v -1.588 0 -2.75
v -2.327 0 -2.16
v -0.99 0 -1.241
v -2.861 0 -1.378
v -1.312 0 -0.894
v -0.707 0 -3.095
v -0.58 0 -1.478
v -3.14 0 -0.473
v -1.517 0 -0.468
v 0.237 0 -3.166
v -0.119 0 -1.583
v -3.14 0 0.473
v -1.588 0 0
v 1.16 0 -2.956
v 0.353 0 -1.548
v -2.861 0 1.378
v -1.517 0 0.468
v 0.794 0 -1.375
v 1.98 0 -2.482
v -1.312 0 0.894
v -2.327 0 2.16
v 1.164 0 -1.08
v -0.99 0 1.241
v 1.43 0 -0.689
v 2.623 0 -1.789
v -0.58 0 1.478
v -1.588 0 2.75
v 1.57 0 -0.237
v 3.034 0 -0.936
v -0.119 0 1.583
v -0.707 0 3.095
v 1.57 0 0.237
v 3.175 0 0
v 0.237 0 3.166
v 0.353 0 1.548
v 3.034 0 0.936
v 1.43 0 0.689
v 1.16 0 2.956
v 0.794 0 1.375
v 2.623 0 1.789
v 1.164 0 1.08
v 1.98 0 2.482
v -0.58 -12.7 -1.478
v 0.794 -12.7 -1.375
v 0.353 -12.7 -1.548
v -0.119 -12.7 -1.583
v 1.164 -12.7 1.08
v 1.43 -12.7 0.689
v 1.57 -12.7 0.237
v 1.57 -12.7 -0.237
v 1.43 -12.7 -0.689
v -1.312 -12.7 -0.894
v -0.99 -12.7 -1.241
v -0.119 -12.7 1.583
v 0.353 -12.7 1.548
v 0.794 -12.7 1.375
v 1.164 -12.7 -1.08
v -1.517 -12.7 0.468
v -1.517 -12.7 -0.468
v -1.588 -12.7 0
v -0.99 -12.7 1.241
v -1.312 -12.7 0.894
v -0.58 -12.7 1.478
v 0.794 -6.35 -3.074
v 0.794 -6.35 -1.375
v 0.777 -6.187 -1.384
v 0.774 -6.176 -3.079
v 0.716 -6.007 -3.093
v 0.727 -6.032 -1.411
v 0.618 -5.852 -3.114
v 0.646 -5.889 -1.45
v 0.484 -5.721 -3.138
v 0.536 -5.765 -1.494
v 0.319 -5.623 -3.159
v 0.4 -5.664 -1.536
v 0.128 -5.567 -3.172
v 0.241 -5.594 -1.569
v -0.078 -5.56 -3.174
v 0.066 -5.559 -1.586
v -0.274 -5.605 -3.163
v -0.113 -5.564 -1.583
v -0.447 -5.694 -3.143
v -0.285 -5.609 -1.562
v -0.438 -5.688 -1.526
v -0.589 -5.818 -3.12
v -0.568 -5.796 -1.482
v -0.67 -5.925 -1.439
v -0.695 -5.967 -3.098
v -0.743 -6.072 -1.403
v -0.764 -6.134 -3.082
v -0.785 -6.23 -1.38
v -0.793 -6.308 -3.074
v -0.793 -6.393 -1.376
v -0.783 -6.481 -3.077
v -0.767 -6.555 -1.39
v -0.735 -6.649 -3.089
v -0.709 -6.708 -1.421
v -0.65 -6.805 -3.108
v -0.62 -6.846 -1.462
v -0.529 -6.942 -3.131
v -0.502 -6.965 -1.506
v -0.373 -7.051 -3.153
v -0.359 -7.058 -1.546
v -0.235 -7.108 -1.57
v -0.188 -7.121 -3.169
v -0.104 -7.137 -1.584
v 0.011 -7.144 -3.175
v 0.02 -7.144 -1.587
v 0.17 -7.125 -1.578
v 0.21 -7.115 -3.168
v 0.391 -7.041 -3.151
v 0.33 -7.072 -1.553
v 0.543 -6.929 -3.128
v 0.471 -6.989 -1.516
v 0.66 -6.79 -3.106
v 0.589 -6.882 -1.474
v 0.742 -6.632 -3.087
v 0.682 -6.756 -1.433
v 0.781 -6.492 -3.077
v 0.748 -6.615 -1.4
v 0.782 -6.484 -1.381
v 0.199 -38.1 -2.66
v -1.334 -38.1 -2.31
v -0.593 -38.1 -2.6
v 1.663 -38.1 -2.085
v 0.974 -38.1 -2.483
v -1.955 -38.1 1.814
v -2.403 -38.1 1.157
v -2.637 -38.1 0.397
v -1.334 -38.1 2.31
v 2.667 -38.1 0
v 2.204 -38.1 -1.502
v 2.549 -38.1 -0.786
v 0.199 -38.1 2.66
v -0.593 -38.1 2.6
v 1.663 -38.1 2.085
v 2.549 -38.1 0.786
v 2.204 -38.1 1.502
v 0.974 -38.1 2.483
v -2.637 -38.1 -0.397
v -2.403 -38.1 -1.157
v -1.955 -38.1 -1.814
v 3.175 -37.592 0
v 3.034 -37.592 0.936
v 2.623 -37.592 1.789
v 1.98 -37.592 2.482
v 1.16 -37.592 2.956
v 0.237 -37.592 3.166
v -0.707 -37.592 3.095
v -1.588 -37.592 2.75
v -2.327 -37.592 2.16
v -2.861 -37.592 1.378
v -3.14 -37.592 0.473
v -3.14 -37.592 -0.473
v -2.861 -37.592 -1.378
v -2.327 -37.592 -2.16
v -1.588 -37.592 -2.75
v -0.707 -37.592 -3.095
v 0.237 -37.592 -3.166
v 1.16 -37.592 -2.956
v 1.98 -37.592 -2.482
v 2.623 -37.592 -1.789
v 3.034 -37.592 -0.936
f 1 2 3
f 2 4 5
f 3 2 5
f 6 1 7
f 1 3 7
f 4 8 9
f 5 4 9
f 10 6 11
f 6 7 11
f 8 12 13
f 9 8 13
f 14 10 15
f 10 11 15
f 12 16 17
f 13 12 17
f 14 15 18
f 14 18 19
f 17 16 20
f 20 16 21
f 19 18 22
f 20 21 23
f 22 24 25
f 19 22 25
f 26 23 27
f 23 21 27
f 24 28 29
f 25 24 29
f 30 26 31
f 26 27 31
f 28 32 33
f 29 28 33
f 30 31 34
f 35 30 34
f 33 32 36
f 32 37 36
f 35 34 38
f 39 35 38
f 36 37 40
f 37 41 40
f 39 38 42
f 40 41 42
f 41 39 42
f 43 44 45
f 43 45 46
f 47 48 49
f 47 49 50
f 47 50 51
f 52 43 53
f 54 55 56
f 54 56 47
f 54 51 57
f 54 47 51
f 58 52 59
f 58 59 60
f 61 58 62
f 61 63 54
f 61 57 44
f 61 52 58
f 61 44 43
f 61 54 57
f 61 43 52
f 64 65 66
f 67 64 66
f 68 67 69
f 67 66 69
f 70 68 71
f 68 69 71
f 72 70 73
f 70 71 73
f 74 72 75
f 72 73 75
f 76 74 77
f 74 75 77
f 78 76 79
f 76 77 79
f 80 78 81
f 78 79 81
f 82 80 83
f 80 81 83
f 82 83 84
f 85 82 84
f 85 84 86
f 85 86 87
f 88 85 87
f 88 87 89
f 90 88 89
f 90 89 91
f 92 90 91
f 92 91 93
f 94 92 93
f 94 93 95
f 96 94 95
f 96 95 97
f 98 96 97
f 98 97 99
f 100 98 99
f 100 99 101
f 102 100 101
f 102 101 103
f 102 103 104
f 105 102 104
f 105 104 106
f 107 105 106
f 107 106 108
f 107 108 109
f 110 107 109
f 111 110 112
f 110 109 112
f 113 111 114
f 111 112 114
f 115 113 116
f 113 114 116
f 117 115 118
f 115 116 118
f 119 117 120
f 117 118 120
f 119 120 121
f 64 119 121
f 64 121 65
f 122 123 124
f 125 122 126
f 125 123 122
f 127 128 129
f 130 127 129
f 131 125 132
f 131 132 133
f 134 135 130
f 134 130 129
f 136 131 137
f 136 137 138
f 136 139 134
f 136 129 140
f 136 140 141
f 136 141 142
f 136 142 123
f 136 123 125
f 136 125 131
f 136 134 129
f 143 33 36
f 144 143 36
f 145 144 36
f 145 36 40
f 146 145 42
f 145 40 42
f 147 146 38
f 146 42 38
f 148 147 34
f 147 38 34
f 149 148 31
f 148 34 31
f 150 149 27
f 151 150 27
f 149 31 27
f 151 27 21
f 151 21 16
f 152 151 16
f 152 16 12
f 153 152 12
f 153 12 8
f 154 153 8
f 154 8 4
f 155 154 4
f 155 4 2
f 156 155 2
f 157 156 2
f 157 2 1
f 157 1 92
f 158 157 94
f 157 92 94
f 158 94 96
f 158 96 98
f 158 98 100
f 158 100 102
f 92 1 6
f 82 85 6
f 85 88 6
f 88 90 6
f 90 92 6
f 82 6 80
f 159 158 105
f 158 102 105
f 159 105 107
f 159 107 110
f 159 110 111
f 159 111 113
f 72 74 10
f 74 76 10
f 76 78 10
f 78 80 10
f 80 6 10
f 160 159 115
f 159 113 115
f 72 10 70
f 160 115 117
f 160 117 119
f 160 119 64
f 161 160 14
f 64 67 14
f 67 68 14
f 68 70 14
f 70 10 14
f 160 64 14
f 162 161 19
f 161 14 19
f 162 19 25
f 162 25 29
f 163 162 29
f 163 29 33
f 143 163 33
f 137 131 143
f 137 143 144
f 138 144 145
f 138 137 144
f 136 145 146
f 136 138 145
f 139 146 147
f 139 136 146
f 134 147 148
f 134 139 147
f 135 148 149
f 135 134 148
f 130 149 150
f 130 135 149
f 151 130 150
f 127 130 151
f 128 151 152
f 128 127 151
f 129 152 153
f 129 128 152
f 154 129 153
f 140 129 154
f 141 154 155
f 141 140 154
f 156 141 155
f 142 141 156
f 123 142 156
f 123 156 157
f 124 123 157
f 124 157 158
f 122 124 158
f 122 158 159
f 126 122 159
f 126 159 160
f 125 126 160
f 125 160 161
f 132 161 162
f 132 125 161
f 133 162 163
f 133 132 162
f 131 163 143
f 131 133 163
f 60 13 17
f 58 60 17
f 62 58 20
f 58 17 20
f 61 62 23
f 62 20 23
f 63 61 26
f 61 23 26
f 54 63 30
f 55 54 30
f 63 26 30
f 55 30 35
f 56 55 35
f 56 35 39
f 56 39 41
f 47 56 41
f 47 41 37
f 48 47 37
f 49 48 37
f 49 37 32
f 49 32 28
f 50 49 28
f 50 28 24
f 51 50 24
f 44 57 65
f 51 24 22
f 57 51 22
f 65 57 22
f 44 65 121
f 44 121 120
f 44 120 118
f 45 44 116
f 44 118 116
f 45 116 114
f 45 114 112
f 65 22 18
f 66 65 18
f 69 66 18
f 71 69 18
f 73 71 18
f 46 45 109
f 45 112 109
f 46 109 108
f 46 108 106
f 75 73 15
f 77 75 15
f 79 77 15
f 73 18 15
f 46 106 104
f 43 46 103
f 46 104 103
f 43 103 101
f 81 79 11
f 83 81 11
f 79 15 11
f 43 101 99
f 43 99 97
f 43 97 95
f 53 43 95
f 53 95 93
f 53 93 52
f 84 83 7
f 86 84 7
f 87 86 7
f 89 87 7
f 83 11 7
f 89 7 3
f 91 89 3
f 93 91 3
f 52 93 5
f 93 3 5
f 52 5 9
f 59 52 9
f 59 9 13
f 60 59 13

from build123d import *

# Parameters (mm, degrees)
F0_R     = 3.175
F1_DEPTH = 38.1
F2_R     = 1.5875
F3_DEPTH = 12.7
F4_R     = 0.79375
F5_DEPTH = 3.176
F6_SIZE  = 0.508


with BuildPart() as f1:
    # F0 (on Front) → F1 (new body)
    with BuildSketch(Plane.XZ):
        Circle(F0_R)
    extrude(amount=F1_DEPTH)

    # F2 (on face) → F3 (cut)
    with BuildSketch(Plane(origin=(0, 0, 0), x_dir=(-1, 0, 0), z_dir=(0, 1, 0))):
        Circle(F2_R)
    extrude(amount=-F3_DEPTH, mode=Mode.SUBTRACT)

    # F4 (on Top) → F5 (cut, through all)
    with BuildSketch(Plane.XY):
        with Locations((0, -6.35)):
            Circle(F4_R)
    extrude(amount=-F5_DEPTH, mode=Mode.SUBTRACT)

    # F6
    f6_edges = [f1.edges().sort_by_distance(p)[0] for p in [
        (-3.175, -38.1, 0),
    ]]
    chamfer(f6_edges, length=F6_SIZE)


solid = f1.part
